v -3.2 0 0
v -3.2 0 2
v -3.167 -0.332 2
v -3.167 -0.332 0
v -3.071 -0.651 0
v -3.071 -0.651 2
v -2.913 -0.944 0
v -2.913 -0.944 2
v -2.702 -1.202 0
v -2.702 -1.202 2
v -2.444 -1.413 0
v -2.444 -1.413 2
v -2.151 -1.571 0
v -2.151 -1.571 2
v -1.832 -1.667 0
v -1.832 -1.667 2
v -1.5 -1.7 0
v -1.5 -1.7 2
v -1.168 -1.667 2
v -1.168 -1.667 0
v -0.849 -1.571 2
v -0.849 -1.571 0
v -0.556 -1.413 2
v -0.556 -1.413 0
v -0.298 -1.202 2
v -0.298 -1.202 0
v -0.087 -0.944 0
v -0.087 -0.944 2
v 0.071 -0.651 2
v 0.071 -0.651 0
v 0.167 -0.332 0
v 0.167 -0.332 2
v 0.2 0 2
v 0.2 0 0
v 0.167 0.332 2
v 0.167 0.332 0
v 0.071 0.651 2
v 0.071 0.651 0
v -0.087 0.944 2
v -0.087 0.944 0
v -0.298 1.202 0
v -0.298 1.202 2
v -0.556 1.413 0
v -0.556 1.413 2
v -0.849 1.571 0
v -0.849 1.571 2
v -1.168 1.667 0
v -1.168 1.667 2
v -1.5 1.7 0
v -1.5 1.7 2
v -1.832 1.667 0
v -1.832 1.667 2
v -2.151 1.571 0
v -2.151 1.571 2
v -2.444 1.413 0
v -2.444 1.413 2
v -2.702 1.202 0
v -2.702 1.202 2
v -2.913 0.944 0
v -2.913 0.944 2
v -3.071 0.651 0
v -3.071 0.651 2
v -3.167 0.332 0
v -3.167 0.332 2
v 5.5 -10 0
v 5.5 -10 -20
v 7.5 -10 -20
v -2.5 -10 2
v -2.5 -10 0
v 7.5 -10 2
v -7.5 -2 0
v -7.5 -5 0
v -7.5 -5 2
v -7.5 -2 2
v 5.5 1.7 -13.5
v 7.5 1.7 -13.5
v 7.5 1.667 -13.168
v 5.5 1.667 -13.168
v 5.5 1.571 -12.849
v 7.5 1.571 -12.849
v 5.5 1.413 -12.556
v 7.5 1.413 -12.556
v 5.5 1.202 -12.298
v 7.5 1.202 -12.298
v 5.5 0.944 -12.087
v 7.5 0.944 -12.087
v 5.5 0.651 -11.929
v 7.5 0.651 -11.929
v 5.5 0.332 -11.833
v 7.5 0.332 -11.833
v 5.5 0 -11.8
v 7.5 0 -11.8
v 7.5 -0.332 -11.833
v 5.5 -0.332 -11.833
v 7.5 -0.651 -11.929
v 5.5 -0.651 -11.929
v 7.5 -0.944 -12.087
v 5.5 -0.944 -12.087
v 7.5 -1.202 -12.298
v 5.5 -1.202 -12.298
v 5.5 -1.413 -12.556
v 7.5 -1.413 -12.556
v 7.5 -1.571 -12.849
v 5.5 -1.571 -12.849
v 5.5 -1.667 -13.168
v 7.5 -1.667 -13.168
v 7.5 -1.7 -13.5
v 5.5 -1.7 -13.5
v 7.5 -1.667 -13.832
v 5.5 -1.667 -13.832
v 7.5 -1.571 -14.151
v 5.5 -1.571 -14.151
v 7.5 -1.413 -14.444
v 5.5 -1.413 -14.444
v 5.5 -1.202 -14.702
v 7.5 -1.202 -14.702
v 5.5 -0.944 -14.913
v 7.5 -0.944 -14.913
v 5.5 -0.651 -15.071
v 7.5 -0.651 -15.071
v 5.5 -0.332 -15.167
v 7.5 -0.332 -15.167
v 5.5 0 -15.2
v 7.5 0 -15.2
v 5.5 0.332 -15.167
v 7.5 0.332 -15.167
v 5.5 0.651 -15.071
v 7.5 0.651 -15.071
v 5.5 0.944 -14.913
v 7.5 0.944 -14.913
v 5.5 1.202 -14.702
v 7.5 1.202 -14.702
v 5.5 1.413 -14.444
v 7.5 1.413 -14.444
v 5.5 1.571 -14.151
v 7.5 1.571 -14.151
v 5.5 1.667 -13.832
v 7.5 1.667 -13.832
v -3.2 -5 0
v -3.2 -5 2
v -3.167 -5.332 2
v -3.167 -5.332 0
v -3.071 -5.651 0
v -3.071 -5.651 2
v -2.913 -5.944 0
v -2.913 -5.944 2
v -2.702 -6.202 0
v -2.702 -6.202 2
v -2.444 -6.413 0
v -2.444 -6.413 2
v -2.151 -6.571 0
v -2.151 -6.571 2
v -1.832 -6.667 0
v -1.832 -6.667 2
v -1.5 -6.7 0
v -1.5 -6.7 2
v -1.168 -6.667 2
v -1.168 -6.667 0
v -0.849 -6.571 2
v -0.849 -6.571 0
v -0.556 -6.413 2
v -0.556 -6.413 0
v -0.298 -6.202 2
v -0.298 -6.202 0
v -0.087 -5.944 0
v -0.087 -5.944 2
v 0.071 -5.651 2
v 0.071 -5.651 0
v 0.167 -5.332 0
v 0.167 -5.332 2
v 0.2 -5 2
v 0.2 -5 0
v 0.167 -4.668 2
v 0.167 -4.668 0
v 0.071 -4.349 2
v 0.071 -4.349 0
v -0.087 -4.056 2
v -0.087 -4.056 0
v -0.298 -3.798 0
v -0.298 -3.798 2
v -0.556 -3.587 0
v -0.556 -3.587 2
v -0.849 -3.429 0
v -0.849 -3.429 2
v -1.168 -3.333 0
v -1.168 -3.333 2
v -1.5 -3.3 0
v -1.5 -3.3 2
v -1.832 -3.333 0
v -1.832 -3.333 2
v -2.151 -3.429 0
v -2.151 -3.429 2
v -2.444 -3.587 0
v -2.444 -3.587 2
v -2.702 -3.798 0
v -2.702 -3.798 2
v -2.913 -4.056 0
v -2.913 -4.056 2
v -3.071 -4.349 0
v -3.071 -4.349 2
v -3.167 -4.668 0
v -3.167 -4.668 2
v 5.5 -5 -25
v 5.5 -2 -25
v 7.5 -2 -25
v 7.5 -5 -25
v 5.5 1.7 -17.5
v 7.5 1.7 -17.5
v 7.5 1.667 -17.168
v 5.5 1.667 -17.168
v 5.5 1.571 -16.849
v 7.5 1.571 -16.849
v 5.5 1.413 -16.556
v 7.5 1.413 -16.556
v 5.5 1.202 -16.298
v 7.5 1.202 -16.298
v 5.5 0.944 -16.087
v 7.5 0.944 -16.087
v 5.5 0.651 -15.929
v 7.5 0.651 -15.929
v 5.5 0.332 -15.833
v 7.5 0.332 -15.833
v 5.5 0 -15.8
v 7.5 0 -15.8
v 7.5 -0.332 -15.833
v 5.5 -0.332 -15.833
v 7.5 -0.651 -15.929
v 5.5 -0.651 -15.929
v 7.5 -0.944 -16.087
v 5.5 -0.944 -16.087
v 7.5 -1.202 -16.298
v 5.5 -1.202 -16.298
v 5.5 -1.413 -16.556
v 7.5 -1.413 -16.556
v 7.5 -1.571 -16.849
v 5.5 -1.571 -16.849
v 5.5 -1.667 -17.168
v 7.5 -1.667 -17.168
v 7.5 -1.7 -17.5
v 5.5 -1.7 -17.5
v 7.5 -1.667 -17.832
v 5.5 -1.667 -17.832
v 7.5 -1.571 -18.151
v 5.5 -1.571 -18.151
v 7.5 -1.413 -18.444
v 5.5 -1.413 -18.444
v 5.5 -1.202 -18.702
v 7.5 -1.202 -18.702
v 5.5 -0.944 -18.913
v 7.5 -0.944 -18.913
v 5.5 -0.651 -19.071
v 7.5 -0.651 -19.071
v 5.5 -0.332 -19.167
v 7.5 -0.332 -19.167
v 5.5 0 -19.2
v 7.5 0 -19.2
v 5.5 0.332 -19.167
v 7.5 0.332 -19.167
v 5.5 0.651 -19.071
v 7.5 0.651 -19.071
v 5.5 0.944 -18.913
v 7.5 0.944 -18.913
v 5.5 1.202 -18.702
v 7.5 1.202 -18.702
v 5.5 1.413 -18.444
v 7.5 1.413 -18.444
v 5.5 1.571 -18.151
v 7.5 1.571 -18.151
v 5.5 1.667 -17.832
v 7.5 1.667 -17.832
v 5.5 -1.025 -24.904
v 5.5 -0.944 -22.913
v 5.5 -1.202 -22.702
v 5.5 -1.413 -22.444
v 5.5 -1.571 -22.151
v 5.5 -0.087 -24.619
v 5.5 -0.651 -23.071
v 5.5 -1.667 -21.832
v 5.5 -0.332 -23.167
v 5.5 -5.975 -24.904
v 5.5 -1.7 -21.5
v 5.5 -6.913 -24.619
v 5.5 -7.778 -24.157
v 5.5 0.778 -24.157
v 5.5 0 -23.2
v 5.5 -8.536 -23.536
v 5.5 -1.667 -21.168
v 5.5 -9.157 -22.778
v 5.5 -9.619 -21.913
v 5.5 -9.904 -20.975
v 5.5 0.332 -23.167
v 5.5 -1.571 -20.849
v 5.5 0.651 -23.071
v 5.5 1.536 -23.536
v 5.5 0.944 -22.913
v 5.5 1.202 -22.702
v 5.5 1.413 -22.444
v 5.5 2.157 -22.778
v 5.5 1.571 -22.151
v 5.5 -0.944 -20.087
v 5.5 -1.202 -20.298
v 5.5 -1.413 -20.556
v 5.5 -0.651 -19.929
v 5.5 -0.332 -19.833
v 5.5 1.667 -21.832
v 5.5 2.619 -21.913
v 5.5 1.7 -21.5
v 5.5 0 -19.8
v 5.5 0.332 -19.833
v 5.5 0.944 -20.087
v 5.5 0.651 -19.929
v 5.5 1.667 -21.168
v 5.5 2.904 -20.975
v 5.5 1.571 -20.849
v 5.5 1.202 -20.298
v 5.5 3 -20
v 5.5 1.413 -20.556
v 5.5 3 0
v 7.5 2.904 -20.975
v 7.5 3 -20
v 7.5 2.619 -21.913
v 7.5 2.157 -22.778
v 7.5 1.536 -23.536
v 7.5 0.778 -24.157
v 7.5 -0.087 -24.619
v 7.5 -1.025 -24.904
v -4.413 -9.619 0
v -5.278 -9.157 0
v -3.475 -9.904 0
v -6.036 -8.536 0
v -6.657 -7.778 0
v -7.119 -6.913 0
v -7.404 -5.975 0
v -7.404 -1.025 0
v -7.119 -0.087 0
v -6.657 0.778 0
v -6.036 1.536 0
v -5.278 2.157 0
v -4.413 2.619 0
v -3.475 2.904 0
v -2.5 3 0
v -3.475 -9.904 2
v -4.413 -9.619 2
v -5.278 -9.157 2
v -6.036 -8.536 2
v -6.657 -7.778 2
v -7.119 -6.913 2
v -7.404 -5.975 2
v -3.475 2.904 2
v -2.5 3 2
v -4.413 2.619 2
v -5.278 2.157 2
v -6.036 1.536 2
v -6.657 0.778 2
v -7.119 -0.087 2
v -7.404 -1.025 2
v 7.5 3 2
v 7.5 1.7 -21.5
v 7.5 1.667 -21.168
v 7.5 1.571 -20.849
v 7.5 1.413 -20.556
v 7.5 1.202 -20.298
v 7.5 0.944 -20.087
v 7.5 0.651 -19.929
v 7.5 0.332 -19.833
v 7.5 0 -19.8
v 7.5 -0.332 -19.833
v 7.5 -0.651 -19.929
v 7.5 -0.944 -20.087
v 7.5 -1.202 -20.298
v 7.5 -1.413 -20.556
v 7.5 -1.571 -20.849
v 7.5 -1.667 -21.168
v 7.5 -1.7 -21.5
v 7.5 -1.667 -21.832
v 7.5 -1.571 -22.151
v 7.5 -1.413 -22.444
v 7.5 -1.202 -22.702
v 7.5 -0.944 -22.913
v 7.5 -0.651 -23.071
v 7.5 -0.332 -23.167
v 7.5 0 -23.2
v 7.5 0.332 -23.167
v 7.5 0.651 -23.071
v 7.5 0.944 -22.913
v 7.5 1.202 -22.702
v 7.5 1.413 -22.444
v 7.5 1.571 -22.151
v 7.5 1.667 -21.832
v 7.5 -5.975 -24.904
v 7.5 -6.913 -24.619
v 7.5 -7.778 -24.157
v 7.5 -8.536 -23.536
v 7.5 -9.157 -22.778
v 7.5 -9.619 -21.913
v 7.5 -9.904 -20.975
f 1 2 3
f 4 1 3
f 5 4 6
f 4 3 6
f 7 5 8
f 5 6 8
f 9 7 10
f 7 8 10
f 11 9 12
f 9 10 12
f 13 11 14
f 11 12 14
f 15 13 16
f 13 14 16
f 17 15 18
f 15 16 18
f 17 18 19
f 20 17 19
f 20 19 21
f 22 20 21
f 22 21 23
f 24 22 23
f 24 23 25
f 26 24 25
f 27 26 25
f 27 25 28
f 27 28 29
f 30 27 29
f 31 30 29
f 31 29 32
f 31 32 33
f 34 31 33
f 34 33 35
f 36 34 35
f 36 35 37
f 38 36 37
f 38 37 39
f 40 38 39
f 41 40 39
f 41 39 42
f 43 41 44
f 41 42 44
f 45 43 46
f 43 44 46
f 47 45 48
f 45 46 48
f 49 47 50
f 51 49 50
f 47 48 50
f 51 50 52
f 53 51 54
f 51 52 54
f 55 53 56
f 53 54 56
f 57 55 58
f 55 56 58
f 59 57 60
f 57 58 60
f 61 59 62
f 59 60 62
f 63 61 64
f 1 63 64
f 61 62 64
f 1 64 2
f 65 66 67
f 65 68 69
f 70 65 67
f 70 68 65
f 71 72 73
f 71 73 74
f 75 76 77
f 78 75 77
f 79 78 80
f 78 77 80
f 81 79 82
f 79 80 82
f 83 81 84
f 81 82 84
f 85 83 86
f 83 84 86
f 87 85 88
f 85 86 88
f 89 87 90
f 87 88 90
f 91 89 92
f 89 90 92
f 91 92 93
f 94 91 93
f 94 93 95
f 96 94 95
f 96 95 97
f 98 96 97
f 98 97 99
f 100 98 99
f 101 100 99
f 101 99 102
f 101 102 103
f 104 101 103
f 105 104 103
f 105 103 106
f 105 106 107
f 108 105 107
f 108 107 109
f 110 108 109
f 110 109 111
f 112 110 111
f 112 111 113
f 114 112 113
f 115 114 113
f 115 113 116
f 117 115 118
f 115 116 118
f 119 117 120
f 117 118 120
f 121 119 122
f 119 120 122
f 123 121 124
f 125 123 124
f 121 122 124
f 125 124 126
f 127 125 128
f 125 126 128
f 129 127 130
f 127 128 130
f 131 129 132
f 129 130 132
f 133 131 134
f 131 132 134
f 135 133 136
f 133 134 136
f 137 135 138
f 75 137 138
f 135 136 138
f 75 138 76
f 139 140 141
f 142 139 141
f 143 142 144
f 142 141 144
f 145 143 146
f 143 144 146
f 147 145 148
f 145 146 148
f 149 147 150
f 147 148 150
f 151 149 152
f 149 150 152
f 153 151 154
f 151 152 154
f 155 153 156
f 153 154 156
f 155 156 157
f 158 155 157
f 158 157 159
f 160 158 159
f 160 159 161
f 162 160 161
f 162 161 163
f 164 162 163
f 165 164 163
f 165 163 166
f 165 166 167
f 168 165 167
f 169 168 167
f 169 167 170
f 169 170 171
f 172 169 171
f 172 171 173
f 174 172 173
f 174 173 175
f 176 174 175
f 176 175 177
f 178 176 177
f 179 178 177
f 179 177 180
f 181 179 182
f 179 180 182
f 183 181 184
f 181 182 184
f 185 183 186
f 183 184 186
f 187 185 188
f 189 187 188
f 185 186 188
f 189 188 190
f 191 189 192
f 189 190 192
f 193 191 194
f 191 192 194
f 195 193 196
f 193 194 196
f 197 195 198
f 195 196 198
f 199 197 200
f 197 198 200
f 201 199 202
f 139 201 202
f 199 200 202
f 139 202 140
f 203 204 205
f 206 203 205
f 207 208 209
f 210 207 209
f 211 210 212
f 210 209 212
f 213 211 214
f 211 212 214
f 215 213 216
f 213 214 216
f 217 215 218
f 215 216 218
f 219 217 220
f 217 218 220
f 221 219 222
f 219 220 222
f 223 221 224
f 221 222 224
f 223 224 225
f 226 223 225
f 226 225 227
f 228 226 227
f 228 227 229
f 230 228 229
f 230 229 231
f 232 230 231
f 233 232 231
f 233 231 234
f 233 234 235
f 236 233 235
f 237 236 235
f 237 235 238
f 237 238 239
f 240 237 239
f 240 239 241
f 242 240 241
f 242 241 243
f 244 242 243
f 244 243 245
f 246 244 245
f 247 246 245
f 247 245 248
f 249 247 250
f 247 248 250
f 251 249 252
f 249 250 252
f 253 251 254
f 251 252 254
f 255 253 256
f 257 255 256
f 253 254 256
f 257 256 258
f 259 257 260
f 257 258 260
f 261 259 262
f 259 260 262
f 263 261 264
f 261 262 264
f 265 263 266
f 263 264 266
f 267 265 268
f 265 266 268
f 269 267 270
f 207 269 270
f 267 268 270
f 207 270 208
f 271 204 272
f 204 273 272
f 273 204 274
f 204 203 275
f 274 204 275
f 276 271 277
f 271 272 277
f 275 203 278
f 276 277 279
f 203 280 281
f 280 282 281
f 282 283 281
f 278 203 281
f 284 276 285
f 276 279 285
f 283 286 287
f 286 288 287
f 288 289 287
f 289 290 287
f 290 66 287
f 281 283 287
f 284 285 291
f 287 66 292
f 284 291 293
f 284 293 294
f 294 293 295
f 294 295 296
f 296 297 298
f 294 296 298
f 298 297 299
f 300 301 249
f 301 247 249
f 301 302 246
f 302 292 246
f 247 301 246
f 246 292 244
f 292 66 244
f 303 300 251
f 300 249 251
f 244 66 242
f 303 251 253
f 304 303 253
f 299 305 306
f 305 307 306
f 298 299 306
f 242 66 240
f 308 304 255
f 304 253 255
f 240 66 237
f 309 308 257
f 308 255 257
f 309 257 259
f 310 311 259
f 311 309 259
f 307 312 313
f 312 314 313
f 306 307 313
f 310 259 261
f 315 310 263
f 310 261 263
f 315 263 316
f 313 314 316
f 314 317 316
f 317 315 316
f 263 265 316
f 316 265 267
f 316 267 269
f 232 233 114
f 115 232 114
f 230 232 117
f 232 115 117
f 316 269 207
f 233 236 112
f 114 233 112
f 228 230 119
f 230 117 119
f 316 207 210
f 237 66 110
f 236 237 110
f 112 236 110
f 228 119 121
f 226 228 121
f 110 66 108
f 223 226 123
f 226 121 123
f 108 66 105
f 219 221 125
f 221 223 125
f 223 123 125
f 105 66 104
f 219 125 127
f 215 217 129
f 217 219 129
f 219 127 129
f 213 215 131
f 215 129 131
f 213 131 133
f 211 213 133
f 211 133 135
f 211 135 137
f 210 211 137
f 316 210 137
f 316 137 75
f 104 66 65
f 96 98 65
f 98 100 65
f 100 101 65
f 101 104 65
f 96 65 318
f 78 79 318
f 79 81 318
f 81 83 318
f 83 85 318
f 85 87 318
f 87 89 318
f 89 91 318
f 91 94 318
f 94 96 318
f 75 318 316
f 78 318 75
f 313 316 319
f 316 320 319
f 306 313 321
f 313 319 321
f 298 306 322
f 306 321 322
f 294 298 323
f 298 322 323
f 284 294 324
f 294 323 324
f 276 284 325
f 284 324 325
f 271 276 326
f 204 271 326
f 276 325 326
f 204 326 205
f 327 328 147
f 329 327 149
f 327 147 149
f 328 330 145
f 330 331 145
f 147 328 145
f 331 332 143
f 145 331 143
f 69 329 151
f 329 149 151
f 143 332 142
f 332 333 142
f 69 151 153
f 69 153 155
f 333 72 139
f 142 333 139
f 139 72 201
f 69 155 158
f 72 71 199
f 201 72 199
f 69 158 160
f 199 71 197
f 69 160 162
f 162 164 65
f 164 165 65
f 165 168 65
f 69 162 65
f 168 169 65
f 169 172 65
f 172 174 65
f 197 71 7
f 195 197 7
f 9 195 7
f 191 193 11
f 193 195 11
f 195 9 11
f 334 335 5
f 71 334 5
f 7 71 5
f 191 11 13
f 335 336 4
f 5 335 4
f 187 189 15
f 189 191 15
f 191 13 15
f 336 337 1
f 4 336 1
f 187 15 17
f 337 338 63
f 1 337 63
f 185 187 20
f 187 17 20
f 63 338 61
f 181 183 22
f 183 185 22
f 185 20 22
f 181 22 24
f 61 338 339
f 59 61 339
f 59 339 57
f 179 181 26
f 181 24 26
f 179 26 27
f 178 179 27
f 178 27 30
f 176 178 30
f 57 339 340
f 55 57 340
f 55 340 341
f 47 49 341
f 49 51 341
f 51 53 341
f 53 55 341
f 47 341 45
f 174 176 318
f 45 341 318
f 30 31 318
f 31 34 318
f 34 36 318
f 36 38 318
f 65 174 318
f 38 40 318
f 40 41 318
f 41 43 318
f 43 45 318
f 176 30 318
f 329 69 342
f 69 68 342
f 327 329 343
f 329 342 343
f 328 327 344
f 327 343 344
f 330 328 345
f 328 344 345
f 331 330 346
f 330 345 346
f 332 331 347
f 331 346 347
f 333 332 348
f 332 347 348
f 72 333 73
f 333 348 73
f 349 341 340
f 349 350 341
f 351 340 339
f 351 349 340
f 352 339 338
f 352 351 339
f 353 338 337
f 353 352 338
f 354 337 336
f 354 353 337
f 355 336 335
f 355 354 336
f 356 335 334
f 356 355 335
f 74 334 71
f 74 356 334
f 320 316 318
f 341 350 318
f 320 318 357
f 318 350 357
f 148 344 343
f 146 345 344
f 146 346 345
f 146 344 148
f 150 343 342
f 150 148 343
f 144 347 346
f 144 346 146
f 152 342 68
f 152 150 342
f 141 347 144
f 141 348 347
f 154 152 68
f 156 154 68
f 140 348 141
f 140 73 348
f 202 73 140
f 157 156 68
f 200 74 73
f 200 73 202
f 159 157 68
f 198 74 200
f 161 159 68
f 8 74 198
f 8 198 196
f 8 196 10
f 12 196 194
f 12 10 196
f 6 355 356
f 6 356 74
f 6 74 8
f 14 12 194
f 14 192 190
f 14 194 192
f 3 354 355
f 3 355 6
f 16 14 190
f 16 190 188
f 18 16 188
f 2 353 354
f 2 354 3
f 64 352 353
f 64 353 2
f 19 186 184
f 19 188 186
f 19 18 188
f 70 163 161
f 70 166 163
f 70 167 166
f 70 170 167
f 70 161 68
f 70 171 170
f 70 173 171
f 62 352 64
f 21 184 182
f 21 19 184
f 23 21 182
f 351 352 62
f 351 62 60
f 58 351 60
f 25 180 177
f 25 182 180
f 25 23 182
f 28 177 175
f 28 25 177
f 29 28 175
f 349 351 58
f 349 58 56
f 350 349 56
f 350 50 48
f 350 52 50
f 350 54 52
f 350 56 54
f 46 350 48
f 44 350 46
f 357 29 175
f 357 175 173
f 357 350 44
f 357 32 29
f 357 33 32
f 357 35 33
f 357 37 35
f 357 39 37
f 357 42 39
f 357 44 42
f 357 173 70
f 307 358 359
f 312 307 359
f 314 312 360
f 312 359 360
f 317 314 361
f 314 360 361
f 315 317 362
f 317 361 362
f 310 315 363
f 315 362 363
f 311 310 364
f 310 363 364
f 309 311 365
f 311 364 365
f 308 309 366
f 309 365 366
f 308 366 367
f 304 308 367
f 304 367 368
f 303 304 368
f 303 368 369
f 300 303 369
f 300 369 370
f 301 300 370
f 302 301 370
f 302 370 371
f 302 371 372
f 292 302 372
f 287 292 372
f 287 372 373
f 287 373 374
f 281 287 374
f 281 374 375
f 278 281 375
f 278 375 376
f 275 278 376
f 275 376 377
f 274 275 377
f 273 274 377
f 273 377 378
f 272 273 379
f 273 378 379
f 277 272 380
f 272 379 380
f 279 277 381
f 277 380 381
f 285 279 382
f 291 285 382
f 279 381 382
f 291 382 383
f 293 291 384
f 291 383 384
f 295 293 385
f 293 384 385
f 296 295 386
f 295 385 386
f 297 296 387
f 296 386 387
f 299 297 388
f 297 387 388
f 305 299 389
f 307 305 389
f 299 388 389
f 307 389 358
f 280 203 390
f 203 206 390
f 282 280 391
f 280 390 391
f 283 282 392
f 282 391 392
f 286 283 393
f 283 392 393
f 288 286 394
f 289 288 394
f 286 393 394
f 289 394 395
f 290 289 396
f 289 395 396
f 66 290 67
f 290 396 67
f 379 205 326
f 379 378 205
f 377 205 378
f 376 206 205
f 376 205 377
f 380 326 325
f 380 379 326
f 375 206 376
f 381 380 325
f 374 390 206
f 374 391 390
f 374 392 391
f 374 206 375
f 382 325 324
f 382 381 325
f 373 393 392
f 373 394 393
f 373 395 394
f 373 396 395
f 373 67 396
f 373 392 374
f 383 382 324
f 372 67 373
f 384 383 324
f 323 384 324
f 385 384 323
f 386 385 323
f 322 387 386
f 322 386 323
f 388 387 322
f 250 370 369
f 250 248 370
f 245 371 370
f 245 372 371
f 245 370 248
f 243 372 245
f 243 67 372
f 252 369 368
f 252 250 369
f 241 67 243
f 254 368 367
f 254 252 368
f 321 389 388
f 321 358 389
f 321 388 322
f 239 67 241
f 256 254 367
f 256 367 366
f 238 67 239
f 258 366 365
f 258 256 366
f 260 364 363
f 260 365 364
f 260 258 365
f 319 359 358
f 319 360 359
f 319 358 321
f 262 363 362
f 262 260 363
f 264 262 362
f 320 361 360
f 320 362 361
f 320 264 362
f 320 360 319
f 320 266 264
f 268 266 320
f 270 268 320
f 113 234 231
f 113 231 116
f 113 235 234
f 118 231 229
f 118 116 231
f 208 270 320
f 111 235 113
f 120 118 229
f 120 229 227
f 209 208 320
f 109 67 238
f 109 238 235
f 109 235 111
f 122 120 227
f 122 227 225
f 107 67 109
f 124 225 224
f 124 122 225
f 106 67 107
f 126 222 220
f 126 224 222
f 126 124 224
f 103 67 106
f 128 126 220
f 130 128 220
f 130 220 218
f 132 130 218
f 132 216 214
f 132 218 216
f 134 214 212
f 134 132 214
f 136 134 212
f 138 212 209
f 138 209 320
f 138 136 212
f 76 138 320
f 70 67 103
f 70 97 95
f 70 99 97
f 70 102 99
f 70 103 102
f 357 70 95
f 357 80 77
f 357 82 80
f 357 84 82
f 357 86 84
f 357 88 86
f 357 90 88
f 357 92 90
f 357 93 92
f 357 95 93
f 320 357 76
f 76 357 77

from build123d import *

# Parameters (mm, degrees)
F0_W     = 2
F0_H     = 20
F0_W_2   = 13
F1_DEPTH = 2
F2_D     = 3.4
F3_DEPTH = 25
F5_D     = 3.4
F6_DEPTH = 7
F7_R     = 5


with BuildPart() as f1:
    # F0 (on Top) → F1 (new body)
    with BuildSketch(Plane.XY):
        with Locations((6.5, 0)):
            Rectangle(F0_W, F0_H)
        with Locations((-1, 0)):
            Rectangle(F0_W_2, F0_H)
    extrude(amount=F1_DEPTH)

    # F2 (through all)
    with Locations(Plane(origin=(0, 0, 0), x_dir=(1, 0, 0), z_dir=(0, 0, -1))):
        with Locations((-1.5, -5), (-1.5, 0), (-1.5, 5)):
            Hole(F2_D / 2)

    # F0 (on Top) → F3 (join)
    with BuildSketch(Plane.XY):
        with Locations((6.5, 0)):
            Rectangle(F0_W, F0_H)
    extrude(amount=-F3_DEPTH)

    # F5 (through all)
    with Locations(Plane(origin=(5.5, 0, 0), x_dir=(0, -1, 0), z_dir=(-1, 0, 0))):
        with Locations((0, -17.5), (0, -13.5), (0, -21.5)):
            Hole(F5_D / 2)

    # F6 (cut): a face of the model
    f6_faces = [f1.faces().sort_by_distance(p)[0] for p in [
        (0, 10, 1.6911310958),
    ]]
    extrude(f6_faces, amount=-F6_DEPTH, mode=Mode.SUBTRACT)

    # F7
    f7_edges = [f1.edges().sort_by_distance(p)[0] for p in [
        (6.5, 3, -25),
        (6.5, -10, -25),
        (-7.5, -10, 1),
        (-7.5, 3, 1),
    ]]
    fillet(f7_edges, radius=F7_R)


solid = f1.part
